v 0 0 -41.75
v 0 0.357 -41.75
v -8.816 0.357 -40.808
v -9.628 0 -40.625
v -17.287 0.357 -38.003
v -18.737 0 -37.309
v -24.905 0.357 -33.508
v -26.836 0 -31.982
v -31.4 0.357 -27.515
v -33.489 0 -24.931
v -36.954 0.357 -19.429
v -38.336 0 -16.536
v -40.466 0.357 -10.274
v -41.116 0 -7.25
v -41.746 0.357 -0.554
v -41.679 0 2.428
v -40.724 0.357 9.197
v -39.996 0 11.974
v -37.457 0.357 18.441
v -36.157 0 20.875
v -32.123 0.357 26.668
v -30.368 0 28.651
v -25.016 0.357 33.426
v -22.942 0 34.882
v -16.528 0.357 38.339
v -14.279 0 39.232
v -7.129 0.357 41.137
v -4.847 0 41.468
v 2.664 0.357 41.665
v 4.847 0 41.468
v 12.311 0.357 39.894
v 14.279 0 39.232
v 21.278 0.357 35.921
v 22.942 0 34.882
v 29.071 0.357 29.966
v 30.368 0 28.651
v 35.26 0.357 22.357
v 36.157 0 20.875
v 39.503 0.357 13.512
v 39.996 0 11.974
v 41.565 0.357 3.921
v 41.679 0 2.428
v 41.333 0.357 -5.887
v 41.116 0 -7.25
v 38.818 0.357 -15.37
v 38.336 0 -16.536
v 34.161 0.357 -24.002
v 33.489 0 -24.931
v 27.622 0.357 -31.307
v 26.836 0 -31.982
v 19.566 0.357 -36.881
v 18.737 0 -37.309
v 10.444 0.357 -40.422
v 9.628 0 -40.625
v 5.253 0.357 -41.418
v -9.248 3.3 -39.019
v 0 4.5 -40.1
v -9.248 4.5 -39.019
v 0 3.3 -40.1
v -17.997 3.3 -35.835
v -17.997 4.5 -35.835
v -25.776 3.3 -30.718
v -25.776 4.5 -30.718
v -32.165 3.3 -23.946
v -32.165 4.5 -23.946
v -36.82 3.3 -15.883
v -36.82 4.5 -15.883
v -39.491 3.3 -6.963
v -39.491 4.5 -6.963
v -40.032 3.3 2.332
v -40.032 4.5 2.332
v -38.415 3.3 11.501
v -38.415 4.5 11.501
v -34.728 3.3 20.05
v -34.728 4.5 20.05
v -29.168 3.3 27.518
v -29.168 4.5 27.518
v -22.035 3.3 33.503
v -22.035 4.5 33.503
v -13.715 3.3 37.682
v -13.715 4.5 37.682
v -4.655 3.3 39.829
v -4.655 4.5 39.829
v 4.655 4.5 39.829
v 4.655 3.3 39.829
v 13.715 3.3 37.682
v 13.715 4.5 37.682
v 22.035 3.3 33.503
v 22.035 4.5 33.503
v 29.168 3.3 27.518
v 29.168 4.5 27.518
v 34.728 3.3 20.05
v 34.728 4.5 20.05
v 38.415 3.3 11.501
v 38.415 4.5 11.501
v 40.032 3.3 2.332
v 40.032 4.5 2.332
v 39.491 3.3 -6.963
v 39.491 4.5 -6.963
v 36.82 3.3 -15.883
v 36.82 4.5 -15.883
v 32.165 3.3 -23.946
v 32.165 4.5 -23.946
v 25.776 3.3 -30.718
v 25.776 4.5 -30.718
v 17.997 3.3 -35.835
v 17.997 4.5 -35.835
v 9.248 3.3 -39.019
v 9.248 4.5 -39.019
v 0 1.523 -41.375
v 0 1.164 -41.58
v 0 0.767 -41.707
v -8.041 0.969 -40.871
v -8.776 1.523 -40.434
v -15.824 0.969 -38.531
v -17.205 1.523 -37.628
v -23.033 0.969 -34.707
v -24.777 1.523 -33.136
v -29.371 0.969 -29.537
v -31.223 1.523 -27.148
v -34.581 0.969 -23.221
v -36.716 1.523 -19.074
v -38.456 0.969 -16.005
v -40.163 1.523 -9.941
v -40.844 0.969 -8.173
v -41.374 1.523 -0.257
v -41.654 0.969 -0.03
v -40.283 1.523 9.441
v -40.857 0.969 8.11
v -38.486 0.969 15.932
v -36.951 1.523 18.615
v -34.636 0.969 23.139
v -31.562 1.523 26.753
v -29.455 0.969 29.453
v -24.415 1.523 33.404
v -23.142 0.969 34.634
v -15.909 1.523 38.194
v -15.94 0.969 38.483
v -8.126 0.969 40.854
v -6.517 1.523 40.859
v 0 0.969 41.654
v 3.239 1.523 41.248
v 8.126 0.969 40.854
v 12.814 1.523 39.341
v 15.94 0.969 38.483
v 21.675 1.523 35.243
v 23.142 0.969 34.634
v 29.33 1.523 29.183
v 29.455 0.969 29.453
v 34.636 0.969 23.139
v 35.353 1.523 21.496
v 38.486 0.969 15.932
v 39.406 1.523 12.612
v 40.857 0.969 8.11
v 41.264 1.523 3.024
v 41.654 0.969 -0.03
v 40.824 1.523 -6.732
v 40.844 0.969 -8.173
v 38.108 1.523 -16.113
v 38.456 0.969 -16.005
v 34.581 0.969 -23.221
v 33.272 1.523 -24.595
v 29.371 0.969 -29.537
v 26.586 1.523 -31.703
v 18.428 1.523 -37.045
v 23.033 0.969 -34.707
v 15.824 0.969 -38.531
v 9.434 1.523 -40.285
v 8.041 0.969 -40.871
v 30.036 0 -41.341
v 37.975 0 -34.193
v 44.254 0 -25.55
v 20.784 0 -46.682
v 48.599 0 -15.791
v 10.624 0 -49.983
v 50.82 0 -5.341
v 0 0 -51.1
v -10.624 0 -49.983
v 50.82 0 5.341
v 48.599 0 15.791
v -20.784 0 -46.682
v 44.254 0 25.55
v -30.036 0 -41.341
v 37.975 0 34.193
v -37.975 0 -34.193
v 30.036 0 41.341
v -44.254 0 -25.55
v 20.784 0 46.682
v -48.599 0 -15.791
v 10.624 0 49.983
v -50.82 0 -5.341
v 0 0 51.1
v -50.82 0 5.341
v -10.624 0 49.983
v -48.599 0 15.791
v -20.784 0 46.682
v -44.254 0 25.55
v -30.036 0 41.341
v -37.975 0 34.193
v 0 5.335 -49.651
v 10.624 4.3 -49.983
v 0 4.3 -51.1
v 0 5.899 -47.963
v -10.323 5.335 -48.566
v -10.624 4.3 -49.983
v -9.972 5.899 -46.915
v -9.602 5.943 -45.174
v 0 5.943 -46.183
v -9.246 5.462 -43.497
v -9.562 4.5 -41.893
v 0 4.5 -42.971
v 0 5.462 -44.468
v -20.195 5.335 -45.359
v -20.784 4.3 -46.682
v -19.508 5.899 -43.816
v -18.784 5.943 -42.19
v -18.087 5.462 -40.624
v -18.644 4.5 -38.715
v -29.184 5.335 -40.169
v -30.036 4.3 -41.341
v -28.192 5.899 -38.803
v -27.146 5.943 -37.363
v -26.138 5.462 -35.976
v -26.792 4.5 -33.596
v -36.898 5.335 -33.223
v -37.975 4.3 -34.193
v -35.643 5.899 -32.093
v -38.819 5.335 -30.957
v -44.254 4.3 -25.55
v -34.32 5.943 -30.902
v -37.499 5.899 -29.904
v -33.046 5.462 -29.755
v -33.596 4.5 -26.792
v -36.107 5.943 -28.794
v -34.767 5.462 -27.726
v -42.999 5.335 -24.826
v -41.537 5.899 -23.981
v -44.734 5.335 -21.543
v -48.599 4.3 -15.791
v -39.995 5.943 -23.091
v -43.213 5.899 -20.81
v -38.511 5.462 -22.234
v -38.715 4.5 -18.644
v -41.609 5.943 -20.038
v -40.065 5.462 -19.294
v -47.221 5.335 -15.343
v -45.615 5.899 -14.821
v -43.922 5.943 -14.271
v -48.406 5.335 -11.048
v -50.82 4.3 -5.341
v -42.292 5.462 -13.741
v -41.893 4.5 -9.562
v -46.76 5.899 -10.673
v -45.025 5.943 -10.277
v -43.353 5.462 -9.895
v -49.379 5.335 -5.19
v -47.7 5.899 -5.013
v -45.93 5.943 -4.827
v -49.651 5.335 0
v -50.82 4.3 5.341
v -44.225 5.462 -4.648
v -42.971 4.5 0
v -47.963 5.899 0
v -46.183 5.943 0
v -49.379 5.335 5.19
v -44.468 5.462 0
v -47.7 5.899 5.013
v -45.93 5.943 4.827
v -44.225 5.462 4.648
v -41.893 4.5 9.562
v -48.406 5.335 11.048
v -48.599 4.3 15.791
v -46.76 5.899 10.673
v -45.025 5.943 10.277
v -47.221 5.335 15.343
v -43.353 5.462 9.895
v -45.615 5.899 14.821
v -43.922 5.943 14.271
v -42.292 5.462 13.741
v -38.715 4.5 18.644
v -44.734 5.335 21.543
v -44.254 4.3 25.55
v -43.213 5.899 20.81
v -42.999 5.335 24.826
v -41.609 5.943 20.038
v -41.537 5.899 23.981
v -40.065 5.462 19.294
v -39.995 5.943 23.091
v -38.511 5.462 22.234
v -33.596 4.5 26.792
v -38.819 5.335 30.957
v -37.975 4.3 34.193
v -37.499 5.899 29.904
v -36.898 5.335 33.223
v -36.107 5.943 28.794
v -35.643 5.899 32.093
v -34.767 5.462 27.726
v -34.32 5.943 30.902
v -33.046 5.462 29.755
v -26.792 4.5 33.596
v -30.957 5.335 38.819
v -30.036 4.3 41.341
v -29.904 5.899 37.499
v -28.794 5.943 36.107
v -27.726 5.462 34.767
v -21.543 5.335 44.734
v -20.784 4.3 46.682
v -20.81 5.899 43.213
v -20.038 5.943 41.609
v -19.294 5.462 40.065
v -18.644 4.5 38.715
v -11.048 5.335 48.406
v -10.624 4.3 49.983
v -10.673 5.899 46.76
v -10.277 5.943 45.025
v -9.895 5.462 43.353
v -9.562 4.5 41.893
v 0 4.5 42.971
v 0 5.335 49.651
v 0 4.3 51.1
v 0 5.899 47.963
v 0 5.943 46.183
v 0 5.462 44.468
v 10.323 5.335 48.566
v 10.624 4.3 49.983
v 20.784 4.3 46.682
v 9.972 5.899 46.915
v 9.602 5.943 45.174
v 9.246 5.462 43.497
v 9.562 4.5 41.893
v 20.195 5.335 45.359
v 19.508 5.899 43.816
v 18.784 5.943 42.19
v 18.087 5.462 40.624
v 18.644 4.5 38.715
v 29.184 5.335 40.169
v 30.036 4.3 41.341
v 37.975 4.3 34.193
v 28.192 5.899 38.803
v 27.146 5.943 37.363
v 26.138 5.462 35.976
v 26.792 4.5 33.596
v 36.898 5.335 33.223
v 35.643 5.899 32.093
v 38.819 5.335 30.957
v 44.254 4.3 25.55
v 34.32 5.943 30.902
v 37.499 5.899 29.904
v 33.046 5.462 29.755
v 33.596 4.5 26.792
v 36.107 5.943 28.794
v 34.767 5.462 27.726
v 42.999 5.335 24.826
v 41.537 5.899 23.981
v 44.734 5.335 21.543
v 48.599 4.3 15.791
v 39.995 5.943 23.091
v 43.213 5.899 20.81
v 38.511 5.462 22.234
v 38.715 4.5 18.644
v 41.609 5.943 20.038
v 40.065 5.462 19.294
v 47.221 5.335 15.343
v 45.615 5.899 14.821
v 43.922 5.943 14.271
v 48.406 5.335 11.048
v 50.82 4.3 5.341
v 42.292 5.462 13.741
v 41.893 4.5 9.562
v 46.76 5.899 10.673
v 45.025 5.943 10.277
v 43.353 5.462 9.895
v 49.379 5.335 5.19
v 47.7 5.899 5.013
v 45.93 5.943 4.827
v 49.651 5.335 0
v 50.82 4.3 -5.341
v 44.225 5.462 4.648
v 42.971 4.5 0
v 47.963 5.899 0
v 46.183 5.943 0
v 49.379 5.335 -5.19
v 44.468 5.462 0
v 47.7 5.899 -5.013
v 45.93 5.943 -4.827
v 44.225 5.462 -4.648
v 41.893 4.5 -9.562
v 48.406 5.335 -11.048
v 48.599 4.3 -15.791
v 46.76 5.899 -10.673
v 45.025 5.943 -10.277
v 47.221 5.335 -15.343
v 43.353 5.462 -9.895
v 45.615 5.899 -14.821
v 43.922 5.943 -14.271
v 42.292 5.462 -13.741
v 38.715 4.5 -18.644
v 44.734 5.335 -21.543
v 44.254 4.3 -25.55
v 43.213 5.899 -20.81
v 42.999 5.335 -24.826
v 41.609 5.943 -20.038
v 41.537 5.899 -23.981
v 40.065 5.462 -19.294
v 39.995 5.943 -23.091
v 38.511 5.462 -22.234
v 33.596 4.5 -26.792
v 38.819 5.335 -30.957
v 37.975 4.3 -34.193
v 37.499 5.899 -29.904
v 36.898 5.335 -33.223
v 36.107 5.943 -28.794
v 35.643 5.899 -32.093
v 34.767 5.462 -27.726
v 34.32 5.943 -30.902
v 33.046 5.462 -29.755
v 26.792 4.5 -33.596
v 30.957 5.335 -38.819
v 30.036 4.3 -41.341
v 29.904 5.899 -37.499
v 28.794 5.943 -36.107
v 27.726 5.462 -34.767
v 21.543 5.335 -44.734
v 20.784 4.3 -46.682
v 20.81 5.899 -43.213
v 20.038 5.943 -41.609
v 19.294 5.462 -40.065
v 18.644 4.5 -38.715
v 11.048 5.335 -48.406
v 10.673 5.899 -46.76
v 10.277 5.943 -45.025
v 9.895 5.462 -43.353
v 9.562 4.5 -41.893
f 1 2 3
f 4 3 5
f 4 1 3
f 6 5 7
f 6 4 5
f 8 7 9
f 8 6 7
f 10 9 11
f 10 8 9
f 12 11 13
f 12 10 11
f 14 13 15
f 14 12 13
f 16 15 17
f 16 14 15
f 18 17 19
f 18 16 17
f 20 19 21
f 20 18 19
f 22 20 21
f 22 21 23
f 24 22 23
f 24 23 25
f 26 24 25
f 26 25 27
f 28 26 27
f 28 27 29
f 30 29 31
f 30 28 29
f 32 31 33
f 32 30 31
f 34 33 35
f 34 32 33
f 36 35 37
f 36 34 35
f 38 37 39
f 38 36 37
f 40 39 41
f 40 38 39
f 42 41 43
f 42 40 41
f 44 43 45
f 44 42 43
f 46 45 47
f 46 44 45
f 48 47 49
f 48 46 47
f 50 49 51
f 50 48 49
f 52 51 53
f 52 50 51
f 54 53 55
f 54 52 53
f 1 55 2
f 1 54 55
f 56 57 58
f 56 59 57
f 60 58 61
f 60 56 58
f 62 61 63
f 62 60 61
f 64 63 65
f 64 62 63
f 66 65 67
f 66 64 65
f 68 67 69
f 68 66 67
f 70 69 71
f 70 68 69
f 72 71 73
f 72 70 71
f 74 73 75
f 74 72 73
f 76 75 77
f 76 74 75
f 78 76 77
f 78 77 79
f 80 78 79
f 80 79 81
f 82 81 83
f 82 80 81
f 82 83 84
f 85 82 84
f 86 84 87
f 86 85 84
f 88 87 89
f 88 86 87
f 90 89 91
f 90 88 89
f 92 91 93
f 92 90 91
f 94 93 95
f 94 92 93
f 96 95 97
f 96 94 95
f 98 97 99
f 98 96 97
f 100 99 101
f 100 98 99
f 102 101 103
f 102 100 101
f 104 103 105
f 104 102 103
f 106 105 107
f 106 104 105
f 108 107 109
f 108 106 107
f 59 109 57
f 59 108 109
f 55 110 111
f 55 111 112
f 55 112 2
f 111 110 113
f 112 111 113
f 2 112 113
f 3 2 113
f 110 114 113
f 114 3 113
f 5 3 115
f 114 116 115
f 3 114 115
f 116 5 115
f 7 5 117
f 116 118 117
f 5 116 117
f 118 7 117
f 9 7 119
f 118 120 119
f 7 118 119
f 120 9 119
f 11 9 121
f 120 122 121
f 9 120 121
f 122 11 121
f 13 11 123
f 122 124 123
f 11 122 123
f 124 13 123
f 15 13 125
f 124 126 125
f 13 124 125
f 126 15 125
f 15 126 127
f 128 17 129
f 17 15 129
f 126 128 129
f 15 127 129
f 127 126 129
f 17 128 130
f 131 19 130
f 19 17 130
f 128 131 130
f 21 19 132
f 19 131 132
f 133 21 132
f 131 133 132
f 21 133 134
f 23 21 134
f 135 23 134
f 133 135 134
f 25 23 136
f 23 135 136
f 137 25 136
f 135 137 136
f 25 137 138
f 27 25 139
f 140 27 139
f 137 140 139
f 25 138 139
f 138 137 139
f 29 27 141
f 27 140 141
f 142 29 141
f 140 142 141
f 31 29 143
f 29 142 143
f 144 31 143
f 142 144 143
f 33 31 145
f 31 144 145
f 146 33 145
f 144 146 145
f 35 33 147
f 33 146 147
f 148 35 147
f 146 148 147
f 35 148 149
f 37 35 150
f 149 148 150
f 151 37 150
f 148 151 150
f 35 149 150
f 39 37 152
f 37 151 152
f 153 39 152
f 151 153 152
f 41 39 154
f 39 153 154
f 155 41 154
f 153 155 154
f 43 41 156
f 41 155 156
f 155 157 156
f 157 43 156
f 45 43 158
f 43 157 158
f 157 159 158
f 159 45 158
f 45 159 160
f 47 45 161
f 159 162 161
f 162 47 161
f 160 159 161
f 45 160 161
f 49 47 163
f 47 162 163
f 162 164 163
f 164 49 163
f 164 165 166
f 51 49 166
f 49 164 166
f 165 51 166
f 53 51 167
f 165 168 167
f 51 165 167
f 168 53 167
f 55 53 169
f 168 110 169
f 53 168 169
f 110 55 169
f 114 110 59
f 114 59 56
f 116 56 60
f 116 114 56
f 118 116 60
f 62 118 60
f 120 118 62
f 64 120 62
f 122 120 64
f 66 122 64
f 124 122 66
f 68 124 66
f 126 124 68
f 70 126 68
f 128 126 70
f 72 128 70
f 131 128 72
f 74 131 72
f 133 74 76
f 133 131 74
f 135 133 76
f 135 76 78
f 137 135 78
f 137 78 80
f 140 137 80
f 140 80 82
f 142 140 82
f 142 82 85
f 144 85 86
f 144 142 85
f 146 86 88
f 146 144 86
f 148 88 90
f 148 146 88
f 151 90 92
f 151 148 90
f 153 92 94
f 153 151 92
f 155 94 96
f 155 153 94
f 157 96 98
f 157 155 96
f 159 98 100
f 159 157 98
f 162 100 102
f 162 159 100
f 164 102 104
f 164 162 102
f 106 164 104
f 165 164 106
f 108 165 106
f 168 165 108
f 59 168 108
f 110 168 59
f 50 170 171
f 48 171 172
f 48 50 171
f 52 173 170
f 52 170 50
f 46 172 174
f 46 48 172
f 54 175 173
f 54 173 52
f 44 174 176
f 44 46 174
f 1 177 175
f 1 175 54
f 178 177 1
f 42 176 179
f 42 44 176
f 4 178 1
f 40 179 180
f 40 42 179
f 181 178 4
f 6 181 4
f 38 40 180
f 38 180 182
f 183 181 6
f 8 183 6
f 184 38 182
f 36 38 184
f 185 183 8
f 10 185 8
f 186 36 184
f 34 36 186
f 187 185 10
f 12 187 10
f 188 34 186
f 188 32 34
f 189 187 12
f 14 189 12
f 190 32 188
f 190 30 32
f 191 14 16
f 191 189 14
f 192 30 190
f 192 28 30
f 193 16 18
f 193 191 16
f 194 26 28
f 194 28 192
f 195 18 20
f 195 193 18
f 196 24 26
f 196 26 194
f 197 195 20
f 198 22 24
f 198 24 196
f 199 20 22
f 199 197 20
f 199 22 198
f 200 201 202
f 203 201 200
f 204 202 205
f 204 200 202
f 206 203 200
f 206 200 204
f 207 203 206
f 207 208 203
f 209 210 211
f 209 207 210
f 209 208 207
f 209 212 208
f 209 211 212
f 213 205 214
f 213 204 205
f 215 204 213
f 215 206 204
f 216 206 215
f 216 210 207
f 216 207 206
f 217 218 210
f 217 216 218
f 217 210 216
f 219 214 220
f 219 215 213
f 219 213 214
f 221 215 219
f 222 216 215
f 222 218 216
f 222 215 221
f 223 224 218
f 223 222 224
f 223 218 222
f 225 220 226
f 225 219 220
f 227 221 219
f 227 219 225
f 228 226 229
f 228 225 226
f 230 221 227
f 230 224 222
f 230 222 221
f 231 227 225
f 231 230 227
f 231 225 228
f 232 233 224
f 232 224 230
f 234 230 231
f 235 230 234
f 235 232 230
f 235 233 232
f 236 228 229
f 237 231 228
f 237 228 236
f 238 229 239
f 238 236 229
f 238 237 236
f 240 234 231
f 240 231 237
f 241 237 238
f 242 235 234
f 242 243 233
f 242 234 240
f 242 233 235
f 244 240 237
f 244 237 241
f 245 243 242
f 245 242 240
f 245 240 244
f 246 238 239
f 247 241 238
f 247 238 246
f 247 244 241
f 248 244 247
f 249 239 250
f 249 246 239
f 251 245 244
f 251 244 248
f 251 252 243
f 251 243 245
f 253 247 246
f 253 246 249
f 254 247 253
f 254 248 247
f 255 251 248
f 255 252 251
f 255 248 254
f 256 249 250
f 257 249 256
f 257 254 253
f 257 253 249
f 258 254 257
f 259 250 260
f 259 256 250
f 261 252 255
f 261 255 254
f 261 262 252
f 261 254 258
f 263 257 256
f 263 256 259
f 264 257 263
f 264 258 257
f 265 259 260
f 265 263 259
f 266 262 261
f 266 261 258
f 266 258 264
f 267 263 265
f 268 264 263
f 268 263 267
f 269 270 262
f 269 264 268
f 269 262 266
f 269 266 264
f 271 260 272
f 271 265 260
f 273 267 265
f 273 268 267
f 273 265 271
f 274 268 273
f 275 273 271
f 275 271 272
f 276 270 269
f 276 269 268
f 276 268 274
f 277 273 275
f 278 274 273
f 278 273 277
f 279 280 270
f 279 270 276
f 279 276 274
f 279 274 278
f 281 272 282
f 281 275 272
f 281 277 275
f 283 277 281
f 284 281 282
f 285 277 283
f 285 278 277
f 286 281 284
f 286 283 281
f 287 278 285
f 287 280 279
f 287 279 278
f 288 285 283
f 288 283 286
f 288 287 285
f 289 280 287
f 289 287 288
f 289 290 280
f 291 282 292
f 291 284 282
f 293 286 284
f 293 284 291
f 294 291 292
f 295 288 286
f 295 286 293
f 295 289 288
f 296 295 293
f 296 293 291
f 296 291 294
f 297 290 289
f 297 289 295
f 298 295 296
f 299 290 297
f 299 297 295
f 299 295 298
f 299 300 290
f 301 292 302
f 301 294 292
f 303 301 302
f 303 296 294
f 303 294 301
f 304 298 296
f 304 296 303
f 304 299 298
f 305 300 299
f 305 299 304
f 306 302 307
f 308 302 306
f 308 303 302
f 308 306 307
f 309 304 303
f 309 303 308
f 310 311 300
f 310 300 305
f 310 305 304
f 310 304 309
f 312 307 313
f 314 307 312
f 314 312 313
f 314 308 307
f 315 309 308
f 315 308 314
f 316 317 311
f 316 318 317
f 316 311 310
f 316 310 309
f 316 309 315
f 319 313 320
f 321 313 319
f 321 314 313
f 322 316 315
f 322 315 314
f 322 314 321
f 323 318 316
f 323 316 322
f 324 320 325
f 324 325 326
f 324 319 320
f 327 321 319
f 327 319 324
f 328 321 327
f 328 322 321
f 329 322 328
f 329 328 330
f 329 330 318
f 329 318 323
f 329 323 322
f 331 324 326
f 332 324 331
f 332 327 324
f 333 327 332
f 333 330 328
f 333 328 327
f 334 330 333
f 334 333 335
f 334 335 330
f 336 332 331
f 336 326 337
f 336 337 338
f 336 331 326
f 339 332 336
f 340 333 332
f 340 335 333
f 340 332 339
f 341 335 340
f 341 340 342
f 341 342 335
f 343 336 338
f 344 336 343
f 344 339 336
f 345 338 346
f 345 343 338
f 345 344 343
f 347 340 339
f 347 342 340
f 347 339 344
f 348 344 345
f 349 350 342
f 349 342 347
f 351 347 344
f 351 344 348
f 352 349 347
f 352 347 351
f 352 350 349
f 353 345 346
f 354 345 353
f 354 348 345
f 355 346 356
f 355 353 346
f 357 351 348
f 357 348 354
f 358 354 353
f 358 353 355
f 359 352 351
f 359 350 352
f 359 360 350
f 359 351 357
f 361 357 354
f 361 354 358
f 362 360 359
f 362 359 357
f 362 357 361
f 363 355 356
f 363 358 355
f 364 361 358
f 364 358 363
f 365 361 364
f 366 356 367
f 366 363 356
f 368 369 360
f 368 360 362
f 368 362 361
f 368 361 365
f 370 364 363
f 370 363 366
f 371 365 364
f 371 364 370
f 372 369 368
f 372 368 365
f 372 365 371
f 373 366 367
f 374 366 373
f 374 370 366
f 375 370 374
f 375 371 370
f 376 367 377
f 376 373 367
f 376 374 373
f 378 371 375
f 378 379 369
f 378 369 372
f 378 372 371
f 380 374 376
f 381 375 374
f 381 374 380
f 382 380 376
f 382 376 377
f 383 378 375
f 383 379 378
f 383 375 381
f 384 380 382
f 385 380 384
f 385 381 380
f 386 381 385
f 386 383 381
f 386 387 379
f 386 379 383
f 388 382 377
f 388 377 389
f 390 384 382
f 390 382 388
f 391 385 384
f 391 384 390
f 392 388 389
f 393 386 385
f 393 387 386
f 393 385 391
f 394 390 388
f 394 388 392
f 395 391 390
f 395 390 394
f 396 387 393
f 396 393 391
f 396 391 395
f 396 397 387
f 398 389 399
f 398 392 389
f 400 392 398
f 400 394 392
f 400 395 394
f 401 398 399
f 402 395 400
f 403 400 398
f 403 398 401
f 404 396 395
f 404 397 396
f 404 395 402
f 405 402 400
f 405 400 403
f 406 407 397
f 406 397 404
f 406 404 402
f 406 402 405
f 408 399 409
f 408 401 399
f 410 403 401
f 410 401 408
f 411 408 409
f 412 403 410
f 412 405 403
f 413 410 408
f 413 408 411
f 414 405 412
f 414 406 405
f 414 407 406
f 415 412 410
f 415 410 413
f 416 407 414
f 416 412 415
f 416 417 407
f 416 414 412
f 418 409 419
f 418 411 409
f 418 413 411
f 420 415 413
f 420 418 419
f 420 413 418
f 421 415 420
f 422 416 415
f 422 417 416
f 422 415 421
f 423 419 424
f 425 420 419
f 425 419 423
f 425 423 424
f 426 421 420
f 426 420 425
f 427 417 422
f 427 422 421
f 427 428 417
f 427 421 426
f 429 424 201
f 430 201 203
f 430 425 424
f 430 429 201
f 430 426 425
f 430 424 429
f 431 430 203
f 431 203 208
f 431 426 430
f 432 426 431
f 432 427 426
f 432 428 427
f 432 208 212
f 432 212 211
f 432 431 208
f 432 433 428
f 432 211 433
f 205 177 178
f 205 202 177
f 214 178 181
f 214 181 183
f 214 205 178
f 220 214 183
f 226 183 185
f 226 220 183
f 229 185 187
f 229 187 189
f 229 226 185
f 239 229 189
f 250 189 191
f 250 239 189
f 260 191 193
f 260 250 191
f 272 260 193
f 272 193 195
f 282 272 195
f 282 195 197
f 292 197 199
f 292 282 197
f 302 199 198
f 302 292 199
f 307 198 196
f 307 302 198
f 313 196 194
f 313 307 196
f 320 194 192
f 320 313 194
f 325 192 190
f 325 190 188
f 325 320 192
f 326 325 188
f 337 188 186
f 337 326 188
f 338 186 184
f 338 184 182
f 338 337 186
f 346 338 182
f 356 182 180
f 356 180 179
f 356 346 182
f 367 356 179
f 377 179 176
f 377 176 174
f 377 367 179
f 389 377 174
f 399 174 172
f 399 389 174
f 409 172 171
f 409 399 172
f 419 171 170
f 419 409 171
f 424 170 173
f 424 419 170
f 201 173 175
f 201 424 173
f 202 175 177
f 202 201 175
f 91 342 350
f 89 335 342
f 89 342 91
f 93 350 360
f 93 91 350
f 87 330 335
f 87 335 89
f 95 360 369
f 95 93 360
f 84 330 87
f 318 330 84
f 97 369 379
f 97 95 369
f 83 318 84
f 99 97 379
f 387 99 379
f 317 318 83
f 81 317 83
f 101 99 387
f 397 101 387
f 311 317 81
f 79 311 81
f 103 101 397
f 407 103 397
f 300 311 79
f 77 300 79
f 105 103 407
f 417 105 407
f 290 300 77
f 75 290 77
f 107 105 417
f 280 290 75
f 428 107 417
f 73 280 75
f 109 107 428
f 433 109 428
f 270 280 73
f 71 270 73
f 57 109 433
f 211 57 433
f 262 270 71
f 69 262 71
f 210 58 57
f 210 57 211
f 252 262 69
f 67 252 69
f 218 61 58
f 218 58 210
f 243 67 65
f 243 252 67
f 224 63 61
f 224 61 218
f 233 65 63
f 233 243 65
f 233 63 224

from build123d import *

# Parameters (mm, degrees)
FILETE1_R = 2


with BuildPart() as part:
    # Esboço1 → Revolução1 (revolve)
    with BuildSketch(Plane.XY, mode=Mode.PRIVATE) as revolu_o1_sk:
        with BuildLine():
            Line((41.75, 0), (51.1, 0))
            Line((51.1, 0), (51.1, 4.3))
            ThreePointArc((51.1, 4.3), (47.074305061, 5.987281185), (42.970510206, 4.5))
            Line((42.970510206, 4.5), (40.1, 4.5))
            Line((40.1, 4.5), (40.1, 3.3))
            Line((40.1, 3.3), (41.75, 1))
            Line((41.75, 1), (41.75, 0))
        make_face()
    revolve(revolu_o1_sk.sketch.rotate(Axis((0, -31.918770764, 0), (0, 1, 0)), 90), axis=Axis((0, -31.918770764, 0), (0, 1, 0)))

    # Filete1
    filete1_edges = [part.edges().sort_by_distance(p)[0] for p in [
        (0, 1, 41.75),
    ]]
    fillet(filete1_edges, radius=FILETE1_R)


solid = part.part
